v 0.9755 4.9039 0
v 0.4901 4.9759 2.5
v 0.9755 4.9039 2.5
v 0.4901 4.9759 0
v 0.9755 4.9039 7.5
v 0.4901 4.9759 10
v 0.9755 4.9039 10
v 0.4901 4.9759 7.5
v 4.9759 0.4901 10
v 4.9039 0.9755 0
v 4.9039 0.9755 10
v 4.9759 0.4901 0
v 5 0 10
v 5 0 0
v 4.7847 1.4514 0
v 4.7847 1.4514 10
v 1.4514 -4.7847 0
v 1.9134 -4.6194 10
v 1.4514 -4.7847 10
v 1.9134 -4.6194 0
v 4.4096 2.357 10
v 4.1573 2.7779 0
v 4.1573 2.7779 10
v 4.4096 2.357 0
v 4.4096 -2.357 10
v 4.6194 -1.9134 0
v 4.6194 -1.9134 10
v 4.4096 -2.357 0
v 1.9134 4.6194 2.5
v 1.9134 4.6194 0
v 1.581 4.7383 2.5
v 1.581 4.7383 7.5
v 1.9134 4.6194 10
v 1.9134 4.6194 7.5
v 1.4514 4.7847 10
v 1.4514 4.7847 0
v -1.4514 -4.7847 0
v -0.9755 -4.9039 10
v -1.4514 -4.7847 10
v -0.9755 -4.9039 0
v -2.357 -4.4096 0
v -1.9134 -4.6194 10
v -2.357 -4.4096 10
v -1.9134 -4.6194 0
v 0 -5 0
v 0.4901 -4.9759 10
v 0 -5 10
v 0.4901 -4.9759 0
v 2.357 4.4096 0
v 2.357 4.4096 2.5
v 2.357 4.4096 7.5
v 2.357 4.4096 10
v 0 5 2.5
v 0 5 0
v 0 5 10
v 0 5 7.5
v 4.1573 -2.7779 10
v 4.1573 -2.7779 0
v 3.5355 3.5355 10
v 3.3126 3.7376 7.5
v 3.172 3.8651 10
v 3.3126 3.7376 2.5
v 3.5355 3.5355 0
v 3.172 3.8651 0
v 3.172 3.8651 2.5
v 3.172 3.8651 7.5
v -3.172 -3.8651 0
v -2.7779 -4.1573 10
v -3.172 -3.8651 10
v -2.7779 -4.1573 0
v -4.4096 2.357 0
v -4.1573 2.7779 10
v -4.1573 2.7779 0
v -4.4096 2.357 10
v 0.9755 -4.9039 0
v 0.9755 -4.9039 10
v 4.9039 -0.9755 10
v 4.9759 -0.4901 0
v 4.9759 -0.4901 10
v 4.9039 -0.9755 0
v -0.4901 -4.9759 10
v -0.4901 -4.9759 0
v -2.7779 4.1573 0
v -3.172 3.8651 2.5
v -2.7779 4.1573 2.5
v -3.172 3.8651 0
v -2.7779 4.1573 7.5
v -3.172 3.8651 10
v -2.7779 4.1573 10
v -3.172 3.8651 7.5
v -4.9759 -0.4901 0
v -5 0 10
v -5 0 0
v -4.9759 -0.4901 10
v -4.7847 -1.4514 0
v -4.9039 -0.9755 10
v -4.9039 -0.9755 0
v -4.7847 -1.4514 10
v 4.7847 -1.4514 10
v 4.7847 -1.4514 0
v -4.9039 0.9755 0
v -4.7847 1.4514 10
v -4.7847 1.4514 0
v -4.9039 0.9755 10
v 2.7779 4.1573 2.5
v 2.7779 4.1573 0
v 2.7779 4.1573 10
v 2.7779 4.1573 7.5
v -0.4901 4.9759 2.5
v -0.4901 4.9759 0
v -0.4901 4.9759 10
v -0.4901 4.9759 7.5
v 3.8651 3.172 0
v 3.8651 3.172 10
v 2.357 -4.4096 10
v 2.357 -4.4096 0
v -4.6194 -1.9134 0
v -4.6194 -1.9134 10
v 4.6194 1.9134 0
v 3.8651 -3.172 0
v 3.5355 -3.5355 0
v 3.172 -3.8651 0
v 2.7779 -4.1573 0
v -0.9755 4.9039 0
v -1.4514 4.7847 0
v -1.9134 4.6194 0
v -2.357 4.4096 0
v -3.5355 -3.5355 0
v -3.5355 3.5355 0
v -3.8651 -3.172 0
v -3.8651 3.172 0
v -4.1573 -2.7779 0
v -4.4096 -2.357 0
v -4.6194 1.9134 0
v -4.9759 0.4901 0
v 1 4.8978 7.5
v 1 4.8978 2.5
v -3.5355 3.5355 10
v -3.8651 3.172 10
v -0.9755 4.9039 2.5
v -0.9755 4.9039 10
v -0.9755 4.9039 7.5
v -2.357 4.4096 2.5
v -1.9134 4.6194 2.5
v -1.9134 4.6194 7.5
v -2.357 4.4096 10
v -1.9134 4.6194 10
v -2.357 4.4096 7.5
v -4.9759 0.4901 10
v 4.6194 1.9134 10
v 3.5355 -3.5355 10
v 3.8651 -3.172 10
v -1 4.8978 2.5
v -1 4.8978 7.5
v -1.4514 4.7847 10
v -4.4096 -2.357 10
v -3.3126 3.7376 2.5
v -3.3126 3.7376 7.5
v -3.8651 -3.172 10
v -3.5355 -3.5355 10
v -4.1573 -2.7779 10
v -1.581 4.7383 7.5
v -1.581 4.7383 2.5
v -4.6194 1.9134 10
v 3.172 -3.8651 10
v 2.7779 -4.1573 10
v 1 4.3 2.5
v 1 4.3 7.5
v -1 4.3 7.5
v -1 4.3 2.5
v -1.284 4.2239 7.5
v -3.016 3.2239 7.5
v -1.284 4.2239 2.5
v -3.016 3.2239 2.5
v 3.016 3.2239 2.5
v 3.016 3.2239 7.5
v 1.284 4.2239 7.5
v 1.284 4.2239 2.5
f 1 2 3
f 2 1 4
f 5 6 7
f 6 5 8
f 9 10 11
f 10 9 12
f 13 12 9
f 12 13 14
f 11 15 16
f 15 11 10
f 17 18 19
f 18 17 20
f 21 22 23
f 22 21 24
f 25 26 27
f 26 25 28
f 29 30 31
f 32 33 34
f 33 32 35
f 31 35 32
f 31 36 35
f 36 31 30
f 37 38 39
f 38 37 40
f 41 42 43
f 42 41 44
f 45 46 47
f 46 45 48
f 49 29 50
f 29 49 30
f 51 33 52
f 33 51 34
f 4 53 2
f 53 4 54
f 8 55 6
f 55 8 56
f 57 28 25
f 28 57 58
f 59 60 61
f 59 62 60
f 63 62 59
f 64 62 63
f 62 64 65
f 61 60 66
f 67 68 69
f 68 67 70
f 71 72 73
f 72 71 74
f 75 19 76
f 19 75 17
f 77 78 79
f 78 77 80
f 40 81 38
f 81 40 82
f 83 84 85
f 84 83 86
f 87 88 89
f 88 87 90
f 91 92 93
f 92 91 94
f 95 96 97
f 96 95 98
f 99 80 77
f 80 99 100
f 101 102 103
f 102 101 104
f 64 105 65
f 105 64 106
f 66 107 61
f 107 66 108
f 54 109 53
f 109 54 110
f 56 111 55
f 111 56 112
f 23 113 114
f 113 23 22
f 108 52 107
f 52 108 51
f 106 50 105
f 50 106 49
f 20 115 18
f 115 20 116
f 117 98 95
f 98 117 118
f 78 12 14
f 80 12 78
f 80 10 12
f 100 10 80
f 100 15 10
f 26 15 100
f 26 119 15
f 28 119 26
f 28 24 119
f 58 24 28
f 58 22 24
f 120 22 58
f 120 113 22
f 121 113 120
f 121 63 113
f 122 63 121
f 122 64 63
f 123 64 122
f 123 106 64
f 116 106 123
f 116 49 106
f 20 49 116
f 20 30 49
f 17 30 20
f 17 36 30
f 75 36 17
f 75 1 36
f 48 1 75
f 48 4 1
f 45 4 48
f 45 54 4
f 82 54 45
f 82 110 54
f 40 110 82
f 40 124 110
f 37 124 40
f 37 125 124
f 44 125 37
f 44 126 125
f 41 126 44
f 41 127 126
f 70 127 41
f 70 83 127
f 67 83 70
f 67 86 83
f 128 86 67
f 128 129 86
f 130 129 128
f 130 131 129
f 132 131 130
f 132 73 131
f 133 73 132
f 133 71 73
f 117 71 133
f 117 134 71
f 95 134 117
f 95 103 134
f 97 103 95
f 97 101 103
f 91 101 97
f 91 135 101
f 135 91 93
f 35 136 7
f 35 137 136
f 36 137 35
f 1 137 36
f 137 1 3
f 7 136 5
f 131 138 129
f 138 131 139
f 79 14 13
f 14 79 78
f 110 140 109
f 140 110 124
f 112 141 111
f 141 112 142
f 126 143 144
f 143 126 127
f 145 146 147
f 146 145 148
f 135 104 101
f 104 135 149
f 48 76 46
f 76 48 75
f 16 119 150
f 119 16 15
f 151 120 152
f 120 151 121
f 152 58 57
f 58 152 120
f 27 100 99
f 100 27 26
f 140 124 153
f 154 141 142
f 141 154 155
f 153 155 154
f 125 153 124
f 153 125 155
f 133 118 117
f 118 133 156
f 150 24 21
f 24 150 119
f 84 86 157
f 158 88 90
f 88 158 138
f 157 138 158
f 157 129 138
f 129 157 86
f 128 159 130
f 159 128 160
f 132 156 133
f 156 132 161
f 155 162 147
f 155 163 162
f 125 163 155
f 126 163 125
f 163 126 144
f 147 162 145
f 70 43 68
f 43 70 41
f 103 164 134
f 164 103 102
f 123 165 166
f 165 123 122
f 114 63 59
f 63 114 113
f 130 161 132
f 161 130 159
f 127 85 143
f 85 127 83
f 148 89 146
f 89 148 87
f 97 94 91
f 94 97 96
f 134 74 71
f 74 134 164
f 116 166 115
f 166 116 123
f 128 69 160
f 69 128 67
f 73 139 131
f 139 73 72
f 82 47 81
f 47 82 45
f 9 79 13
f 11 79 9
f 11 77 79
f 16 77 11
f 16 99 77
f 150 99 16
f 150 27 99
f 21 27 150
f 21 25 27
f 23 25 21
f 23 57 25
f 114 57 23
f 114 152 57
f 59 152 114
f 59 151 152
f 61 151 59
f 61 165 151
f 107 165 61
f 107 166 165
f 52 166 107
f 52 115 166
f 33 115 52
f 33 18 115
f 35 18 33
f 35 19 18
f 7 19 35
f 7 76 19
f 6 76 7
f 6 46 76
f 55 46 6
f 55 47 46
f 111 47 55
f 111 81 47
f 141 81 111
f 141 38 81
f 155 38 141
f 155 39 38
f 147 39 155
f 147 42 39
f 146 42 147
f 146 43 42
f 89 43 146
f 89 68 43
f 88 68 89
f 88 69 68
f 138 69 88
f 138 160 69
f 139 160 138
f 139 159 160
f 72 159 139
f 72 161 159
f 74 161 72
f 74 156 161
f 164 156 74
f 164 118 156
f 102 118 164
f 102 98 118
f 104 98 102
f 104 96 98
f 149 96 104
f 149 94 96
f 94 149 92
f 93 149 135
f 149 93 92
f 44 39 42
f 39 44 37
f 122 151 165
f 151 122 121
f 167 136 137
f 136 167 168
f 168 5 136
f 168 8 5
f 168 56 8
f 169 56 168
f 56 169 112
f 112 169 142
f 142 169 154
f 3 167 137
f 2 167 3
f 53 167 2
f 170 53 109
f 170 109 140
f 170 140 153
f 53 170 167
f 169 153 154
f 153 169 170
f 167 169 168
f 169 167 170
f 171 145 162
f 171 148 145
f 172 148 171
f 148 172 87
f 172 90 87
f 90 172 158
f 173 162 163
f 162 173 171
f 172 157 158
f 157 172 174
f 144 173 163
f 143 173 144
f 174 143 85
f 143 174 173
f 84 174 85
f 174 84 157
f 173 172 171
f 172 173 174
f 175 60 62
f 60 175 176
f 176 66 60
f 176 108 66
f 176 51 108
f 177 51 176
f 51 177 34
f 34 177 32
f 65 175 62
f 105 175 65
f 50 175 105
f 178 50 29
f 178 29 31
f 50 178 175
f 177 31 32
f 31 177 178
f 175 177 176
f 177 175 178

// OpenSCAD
module okno(sirka, vyska, hloubka=1) {
  translate([-sirka/2,0,0]) cube([sirka,hloubka,vyska]);
}

difference() {
  cylinder(10,5,5, $fn=64);
  translate([0,4.3,2.5]) okno(2,5);
  rotate(30,[0,0,1]) translate([0,4.3,2.5]) okno(2,5);
  rotate(-30,[0,0,1]) translate([0,4.3,2.5]) okno(2,5);
}
